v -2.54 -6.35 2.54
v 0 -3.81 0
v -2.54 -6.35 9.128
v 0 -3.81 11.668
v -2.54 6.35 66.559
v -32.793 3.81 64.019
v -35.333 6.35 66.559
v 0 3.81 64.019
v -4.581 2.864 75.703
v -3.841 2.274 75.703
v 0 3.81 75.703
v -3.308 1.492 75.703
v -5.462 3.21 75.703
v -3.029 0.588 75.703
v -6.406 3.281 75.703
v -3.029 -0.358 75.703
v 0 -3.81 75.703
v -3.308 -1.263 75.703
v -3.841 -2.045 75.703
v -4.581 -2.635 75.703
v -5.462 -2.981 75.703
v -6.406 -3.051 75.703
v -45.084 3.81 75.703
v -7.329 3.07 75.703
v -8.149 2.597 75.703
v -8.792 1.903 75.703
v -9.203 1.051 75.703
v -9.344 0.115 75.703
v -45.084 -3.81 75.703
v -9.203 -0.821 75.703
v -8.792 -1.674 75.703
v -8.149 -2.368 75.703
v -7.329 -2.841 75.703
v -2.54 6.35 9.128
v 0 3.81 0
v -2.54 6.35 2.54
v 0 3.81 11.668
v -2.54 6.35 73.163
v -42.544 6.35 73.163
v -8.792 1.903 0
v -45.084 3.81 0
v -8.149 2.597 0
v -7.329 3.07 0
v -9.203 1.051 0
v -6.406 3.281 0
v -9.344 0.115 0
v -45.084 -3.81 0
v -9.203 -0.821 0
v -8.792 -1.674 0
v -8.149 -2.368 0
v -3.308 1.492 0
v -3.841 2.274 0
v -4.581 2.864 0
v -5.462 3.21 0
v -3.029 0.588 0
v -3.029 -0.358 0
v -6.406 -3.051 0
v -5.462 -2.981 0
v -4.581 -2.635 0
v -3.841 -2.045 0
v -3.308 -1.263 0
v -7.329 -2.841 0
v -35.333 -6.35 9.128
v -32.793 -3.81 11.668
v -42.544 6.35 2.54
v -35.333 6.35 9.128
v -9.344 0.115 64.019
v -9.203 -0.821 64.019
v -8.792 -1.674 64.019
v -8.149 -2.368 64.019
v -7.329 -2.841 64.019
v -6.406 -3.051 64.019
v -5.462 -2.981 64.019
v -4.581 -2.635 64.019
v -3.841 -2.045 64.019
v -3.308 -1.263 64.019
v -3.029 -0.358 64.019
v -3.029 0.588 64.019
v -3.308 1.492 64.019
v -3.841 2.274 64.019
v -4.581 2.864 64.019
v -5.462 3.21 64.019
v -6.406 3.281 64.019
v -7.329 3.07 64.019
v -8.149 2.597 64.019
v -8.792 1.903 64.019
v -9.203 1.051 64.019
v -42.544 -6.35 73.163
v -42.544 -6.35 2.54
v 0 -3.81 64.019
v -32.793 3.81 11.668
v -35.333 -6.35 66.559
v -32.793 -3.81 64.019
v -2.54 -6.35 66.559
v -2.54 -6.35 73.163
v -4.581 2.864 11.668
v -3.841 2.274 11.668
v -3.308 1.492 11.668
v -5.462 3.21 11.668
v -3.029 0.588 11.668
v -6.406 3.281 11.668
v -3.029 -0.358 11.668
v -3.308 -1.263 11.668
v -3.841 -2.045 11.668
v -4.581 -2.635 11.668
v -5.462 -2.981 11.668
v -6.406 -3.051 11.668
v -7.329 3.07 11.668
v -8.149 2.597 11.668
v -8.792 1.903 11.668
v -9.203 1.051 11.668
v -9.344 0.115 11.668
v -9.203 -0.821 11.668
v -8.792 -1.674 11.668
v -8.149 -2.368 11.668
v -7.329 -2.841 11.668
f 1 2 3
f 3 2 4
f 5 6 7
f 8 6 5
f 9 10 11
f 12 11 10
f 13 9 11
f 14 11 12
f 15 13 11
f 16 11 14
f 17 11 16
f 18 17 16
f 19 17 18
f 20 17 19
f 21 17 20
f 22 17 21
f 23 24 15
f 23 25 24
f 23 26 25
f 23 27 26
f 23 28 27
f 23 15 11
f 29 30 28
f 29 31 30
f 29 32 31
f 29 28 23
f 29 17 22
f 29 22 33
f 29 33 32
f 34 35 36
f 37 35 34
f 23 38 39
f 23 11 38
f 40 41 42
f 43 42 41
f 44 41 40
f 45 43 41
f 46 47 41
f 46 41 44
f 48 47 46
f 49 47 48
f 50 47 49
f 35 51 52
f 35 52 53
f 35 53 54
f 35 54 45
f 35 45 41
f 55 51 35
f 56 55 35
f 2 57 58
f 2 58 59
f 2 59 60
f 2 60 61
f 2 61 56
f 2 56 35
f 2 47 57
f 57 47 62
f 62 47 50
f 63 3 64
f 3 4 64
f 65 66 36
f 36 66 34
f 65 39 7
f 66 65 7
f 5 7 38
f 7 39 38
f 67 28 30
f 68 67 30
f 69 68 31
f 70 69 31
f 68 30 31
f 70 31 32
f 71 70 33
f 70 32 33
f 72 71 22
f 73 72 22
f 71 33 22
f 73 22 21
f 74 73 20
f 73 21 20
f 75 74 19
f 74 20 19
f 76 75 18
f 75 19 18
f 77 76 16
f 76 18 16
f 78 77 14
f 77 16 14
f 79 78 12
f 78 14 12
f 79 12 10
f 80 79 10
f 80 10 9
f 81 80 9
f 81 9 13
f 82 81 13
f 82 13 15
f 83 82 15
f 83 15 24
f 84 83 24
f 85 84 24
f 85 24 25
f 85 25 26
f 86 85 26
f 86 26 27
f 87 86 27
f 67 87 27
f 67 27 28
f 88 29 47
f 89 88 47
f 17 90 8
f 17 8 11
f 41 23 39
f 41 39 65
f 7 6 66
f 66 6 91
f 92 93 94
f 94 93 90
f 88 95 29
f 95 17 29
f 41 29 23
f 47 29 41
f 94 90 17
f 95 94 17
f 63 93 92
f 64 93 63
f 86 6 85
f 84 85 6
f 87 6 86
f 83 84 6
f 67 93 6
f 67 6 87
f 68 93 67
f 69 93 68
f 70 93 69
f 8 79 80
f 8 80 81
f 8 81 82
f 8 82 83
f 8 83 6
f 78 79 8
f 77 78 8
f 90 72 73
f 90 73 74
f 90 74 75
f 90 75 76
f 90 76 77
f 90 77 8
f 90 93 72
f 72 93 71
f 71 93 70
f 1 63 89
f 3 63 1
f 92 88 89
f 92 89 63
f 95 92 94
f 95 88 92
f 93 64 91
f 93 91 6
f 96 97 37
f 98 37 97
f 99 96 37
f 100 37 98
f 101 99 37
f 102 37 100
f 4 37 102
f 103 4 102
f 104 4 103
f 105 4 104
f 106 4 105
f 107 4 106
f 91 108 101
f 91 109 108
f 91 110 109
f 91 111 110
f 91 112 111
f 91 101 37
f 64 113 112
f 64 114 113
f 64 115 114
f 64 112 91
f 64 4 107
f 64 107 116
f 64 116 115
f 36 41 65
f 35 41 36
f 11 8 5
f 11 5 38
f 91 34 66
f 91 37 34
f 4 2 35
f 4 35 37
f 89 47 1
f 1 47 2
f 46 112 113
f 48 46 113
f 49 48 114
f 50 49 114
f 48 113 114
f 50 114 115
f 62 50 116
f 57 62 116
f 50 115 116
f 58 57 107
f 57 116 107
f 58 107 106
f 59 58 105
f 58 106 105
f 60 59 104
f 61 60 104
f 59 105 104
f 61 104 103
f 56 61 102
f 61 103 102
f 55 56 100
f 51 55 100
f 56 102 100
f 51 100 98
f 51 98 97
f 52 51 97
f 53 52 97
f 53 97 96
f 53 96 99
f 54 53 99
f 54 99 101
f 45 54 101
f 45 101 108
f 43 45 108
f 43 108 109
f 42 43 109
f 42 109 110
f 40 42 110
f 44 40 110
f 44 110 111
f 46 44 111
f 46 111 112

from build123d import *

# Parameters (mm, degrees)
F1_DEPTH = 6.35
F3_D     = 6.35
F4_SIZE  = 2.54
F5_SIZE  = 2.54
F6_SIZE  = 2.53999


# Not quite as in the source:
# - a fillet or chamfer is up to 0.001 mm smaller than in the source, because OpenCascade refuses the exact size


with BuildPart() as f1:
    # F0 (on Front) → F1 (new body, symmetric)
    with BuildSketch(Plane.XZ):
        Polygon((-45.0841039419, 0), (0, 0), (0, 11.6680786014), (-32.7930003405, 11.6680786014), (-32.7930003405, 64.019061625), (0, 64.019061625), (0, 75.703188777), (-45.0841039419, 75.703188777), align=None)
    extrude(amount=F1_DEPTH, both=True)

    # F3 (through all)
    with Locations(Plane(origin=(0, 0, 0), x_dir=(1, 0, 0), z_dir=(0, 0, -1))):
        with Locations((-6.1689345166, -0.1147333004)):
            Hole(F3_D / 2)

    # F4
    f4_edges = [f1.edges().sort_by_distance(p)[0] for p in [
        (-22.542052, -6.35, 75.703189),
        (-22.542052, 6.35, 75.703189),
        (-16.3965, -6.35, 64.019062),
        (0, -6.35, 69.861125),
        (0, 6.35, 69.861125),
        (-16.3965, 6.35, 64.019062),
    ]]
    chamfer(f4_edges, length=F4_SIZE)

    # F5
    f5_edges = [f1.edges().sort_by_distance(p)[0] for p in [
        (-22.542052, 6.35, 0),
        (0, -6.35, 5.834039),
        (-22.542052, -6.35, 0),
        (-16.3965, -6.35, 11.668079),
        (0, 6.35, 5.834039),
        (-16.3965, 6.35, 11.668079),
    ]]
    chamfer(f5_edges, length=F5_SIZE)

    # F6 (size 2.54 in the source; OpenCascade refuses exactly that, so slightly less here)
    f6_edges = [f1.edges().sort_by_distance(p)[0] for p in [
        (-45.084104, 6.35, 37.851594),
        (-32.793, -6.35, 37.84357),
        (-32.793, 6.35, 37.84357),
        (-45.084104, -6.35, 37.851594),
    ]]
    chamfer(f6_edges, length=F6_SIZE)


solid = f1.part
